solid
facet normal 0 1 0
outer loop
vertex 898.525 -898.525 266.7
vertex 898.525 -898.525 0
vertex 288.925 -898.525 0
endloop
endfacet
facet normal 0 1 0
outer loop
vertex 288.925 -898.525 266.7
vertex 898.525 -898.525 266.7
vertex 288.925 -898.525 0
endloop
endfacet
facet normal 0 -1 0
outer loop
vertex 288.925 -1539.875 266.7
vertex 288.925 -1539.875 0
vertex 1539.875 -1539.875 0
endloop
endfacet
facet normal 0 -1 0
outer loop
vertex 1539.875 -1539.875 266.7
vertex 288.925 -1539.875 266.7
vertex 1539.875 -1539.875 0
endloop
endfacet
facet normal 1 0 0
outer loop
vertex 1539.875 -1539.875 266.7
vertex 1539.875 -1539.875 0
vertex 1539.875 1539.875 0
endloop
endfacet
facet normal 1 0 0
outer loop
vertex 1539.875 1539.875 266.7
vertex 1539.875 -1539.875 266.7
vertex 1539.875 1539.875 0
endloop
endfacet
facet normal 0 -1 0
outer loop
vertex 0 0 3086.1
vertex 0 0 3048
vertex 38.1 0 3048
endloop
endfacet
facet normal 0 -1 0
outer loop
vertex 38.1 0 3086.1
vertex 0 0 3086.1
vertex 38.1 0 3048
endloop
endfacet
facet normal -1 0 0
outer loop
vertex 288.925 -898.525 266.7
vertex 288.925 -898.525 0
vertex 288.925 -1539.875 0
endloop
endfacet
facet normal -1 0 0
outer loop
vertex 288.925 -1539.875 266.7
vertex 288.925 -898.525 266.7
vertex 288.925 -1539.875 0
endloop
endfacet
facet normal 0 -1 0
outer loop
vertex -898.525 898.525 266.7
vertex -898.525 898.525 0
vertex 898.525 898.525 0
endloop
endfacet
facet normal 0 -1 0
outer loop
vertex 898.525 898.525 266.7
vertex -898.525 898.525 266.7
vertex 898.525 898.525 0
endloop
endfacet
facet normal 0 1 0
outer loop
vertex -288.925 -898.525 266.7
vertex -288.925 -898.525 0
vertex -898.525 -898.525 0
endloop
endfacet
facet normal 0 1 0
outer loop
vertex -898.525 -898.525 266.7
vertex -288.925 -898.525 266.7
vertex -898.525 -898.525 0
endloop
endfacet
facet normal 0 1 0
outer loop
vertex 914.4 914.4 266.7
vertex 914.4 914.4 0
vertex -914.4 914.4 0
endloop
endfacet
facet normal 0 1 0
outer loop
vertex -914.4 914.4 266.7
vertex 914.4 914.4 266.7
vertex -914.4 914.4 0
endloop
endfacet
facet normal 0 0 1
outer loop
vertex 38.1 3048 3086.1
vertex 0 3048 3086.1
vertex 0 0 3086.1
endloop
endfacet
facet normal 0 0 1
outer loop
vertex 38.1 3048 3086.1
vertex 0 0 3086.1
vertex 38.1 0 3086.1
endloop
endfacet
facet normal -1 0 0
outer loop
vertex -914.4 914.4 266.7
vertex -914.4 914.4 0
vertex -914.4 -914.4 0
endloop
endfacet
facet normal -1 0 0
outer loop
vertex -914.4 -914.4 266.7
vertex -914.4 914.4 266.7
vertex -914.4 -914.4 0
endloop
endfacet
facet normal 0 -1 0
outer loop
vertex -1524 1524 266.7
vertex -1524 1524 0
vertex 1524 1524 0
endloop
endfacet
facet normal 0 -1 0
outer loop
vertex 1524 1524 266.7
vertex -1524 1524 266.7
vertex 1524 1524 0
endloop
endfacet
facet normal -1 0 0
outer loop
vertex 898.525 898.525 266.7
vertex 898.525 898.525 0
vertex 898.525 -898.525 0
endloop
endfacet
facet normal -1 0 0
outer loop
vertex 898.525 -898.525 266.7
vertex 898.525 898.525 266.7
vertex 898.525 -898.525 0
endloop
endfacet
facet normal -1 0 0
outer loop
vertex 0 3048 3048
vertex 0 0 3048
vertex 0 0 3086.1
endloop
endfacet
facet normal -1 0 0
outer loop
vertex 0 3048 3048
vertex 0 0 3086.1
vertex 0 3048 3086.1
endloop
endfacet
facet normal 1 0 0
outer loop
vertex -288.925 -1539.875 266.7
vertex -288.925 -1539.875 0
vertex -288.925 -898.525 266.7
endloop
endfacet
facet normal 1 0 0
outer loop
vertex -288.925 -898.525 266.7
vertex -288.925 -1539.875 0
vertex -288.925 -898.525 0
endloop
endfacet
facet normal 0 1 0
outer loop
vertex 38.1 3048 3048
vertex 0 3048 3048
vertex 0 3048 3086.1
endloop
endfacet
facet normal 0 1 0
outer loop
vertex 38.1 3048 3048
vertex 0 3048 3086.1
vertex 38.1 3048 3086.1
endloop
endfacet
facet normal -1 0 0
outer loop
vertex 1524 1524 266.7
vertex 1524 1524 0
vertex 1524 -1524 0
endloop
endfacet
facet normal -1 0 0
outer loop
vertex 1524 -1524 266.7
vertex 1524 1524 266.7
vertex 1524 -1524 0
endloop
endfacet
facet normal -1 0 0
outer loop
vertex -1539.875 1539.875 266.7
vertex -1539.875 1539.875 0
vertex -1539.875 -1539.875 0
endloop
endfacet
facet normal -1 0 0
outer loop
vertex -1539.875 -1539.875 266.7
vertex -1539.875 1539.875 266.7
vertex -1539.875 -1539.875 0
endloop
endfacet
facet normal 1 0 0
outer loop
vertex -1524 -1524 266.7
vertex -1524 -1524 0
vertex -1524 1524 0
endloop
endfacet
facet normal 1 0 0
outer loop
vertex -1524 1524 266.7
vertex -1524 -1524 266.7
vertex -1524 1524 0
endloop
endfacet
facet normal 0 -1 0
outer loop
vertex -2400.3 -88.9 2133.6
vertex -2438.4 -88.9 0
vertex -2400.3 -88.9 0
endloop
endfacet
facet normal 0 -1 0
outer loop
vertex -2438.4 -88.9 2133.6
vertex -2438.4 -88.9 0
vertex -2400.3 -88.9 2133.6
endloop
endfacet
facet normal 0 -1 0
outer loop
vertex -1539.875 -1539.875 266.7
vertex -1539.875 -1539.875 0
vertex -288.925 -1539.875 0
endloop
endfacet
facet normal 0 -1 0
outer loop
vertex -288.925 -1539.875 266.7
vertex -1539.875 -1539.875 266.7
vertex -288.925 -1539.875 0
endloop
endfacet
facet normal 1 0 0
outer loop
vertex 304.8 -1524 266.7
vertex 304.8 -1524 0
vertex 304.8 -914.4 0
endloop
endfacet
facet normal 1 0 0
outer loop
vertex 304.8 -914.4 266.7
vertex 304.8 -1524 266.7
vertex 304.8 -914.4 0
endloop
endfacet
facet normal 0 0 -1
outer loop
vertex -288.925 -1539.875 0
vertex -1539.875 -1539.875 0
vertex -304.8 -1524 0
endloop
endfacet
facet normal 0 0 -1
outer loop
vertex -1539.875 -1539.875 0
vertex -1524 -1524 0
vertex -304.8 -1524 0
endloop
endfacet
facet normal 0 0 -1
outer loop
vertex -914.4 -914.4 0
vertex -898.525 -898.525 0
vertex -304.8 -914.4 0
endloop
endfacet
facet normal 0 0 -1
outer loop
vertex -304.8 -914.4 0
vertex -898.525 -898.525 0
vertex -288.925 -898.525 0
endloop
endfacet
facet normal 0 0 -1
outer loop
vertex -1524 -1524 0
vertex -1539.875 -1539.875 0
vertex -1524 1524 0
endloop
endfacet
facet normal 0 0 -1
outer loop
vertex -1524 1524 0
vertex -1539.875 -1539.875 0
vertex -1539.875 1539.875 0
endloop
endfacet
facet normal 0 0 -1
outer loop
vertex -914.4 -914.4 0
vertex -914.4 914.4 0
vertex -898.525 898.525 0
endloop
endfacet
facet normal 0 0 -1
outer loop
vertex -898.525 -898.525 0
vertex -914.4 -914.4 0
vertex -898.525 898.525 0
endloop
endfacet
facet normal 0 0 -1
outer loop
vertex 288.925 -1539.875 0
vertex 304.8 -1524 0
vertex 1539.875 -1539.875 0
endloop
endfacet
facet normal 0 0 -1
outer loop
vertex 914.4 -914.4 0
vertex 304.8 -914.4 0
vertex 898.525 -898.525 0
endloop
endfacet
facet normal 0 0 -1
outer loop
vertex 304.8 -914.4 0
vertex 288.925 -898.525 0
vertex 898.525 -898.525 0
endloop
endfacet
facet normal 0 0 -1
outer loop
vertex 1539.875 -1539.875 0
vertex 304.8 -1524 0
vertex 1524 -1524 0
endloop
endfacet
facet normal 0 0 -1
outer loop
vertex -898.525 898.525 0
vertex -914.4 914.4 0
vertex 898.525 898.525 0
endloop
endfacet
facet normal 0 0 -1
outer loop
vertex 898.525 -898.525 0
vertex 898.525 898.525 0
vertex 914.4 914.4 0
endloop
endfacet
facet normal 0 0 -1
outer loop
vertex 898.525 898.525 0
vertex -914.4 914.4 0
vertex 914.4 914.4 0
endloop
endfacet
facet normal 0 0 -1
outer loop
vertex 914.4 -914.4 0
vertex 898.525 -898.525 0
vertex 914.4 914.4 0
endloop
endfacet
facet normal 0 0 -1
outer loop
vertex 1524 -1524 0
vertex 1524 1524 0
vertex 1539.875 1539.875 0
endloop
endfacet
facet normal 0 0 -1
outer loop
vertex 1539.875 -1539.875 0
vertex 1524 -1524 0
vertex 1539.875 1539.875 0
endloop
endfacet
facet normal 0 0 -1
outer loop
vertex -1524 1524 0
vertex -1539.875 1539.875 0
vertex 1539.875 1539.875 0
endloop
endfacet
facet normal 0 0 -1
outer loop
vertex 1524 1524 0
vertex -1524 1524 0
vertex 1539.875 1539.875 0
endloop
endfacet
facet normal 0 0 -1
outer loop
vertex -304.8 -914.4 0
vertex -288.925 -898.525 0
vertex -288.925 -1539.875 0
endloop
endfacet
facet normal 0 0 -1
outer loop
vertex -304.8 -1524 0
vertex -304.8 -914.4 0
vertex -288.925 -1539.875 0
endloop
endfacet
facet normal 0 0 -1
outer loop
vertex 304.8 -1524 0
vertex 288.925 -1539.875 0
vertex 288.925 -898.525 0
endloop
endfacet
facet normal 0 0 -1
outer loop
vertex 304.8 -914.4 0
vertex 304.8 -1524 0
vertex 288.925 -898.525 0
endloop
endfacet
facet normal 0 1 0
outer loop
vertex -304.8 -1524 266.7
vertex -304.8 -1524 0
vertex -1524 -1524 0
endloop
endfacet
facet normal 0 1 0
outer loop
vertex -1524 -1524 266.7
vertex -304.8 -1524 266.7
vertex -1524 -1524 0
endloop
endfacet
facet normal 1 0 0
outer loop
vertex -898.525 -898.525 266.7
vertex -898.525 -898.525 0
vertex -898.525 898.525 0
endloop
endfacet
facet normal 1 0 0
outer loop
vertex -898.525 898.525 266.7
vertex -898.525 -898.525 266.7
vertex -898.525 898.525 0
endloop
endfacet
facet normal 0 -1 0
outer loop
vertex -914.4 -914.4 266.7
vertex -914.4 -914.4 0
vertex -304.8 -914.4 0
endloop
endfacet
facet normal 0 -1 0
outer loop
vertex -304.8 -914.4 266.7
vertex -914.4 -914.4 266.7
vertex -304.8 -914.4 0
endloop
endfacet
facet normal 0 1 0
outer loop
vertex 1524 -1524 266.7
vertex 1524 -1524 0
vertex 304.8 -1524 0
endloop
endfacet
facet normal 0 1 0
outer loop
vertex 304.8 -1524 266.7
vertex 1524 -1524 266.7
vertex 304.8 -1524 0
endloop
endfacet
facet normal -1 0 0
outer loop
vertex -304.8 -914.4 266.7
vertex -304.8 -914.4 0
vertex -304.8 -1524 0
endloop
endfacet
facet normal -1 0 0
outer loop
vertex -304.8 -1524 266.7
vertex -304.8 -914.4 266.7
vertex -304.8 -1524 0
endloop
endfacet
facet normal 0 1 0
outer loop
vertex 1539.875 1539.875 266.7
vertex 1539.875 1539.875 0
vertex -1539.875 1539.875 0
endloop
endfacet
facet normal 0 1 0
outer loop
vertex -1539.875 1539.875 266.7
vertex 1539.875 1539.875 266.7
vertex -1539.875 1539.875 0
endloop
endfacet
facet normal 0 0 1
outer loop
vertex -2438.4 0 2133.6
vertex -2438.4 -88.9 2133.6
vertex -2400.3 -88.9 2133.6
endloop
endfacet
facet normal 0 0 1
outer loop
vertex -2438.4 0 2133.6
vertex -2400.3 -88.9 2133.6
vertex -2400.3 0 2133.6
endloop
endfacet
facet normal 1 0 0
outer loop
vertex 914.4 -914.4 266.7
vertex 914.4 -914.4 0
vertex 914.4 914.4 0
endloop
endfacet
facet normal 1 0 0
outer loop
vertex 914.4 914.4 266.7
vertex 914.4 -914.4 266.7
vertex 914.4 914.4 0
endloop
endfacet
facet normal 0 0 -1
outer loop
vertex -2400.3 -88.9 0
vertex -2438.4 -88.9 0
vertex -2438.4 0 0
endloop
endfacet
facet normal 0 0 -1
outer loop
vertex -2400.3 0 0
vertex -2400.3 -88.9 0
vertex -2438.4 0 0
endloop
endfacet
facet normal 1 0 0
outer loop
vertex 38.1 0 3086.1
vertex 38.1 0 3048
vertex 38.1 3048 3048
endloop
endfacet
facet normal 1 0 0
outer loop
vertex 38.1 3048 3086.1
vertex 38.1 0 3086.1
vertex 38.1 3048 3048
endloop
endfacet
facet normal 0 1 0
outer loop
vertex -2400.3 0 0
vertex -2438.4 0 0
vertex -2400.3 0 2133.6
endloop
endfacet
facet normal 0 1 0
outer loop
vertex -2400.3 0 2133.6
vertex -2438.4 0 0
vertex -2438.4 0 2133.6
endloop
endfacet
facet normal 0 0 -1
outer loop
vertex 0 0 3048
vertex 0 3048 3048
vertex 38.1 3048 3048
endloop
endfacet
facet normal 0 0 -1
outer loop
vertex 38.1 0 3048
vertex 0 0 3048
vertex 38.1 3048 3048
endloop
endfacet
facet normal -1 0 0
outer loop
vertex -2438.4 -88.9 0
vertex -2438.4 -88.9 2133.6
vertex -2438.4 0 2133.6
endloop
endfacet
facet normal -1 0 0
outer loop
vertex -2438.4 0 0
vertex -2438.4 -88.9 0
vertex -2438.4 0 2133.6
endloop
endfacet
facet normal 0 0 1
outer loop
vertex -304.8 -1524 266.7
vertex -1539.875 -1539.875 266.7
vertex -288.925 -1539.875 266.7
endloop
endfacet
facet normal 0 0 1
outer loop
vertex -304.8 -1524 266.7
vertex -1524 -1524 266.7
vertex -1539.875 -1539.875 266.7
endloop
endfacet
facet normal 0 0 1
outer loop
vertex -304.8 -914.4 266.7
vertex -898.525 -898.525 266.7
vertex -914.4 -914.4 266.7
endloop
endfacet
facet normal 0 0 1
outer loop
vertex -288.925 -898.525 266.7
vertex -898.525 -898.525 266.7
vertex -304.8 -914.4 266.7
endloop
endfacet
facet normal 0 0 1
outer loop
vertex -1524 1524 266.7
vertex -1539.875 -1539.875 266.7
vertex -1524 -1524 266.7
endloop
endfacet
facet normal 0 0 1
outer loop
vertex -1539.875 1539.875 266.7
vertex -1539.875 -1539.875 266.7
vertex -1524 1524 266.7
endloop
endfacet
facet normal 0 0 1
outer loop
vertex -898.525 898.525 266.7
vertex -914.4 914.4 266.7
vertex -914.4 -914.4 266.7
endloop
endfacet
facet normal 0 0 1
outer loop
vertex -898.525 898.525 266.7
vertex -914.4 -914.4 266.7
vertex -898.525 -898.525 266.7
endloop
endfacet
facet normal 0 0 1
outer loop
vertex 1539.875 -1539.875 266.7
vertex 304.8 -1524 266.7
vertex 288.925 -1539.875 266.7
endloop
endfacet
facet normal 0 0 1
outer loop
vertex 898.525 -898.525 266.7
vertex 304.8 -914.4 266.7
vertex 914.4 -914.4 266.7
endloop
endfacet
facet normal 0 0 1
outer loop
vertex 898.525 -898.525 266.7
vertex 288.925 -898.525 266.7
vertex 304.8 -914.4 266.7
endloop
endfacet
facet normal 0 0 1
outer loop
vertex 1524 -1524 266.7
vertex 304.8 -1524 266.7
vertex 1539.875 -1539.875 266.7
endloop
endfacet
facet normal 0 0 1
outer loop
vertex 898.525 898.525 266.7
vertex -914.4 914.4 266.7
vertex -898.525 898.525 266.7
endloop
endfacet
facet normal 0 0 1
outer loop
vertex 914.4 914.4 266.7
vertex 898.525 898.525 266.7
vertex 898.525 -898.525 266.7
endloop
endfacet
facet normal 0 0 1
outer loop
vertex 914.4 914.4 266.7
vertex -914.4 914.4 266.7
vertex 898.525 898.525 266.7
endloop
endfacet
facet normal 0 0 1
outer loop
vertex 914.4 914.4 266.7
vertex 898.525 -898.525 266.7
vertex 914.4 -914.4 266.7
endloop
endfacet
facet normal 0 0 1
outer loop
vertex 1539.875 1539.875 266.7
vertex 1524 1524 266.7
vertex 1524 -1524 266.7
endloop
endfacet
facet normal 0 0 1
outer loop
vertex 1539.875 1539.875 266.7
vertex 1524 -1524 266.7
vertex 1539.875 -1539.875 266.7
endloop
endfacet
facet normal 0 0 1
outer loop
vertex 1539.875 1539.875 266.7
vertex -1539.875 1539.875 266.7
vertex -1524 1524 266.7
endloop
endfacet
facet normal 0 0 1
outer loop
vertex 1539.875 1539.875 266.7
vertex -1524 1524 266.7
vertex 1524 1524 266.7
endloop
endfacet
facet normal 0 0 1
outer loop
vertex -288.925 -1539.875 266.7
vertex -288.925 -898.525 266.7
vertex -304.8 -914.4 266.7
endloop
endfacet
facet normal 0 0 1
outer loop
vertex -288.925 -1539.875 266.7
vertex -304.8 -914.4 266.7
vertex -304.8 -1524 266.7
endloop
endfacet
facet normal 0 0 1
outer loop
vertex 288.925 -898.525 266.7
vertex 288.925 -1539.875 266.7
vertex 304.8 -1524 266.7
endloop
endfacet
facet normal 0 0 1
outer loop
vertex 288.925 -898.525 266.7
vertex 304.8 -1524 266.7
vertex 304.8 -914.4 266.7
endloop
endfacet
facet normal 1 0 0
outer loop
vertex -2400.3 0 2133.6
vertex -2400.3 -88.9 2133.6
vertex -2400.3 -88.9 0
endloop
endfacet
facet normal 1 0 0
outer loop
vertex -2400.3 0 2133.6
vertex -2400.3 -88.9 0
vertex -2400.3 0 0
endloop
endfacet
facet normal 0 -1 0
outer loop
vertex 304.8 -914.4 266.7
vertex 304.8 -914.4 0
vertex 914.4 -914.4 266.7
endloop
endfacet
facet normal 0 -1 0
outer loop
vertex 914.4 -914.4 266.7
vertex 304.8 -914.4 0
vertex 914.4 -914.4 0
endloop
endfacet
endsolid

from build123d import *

# Parameters (mm, degrees)
F1_DEPTH = 266.7
F3_W     = 88.900001
F3_H     = 2133.6
F4_DEPTH = 38.1
F6_W     = 38.1
F6_H     = 3048
F7_DEPTH = 38.1


with BuildPart() as f1:
    # F0 (on Top) → F1 (new body)
    with BuildSketch(Plane.XY):
        Polygon((288.925146, -1539.875005), (1539.875005, -1539.875005), (1539.875005, 1539.875005), (-1539.875005, 1539.875005), (-1539.875005, -1539.875005), (-288.925146, -1539.875005), (-288.925146, -898.524999), (-898.524999, -898.524999), (-898.524999, 898.524999), (898.524999, 898.524999), (898.524999, -898.524999), (288.925146, -898.524999), align=None)
        Polygon((1524.000145, 1524), (1524.000145, -1524), (304.800145, -1524), (304.800145, -914.4), (914.4, -914.4), (914.4, 914.4), (-914.4, 914.4), (-914.4, -914.4), (-304.800145, -914.4), (-304.800145, -1524), (-1524.000145, -1524), (-1524.000145, 1524), align=None, mode=Mode.SUBTRACT)
    extrude(amount=F1_DEPTH)


with BuildPart() as f4:
    # F3 (on offset) → F4 (new body)
    with BuildSketch(Plane.YZ.offset(-2438.4)):
        with Locations((-44.45, 1066.8)):
            Rectangle(F3_W, F3_H)
    extrude(amount=F4_DEPTH)


with BuildPart() as f7:
    # F6 (on offset) → F7 (new body)
    with BuildSketch(Plane.XY.offset(3048)):
        with Locations((19.05, 1524)):
            Rectangle(F6_W, F6_H)
    extrude(amount=F7_DEPTH)


solid = Compound([f1.part, f4.part, f7.part])
